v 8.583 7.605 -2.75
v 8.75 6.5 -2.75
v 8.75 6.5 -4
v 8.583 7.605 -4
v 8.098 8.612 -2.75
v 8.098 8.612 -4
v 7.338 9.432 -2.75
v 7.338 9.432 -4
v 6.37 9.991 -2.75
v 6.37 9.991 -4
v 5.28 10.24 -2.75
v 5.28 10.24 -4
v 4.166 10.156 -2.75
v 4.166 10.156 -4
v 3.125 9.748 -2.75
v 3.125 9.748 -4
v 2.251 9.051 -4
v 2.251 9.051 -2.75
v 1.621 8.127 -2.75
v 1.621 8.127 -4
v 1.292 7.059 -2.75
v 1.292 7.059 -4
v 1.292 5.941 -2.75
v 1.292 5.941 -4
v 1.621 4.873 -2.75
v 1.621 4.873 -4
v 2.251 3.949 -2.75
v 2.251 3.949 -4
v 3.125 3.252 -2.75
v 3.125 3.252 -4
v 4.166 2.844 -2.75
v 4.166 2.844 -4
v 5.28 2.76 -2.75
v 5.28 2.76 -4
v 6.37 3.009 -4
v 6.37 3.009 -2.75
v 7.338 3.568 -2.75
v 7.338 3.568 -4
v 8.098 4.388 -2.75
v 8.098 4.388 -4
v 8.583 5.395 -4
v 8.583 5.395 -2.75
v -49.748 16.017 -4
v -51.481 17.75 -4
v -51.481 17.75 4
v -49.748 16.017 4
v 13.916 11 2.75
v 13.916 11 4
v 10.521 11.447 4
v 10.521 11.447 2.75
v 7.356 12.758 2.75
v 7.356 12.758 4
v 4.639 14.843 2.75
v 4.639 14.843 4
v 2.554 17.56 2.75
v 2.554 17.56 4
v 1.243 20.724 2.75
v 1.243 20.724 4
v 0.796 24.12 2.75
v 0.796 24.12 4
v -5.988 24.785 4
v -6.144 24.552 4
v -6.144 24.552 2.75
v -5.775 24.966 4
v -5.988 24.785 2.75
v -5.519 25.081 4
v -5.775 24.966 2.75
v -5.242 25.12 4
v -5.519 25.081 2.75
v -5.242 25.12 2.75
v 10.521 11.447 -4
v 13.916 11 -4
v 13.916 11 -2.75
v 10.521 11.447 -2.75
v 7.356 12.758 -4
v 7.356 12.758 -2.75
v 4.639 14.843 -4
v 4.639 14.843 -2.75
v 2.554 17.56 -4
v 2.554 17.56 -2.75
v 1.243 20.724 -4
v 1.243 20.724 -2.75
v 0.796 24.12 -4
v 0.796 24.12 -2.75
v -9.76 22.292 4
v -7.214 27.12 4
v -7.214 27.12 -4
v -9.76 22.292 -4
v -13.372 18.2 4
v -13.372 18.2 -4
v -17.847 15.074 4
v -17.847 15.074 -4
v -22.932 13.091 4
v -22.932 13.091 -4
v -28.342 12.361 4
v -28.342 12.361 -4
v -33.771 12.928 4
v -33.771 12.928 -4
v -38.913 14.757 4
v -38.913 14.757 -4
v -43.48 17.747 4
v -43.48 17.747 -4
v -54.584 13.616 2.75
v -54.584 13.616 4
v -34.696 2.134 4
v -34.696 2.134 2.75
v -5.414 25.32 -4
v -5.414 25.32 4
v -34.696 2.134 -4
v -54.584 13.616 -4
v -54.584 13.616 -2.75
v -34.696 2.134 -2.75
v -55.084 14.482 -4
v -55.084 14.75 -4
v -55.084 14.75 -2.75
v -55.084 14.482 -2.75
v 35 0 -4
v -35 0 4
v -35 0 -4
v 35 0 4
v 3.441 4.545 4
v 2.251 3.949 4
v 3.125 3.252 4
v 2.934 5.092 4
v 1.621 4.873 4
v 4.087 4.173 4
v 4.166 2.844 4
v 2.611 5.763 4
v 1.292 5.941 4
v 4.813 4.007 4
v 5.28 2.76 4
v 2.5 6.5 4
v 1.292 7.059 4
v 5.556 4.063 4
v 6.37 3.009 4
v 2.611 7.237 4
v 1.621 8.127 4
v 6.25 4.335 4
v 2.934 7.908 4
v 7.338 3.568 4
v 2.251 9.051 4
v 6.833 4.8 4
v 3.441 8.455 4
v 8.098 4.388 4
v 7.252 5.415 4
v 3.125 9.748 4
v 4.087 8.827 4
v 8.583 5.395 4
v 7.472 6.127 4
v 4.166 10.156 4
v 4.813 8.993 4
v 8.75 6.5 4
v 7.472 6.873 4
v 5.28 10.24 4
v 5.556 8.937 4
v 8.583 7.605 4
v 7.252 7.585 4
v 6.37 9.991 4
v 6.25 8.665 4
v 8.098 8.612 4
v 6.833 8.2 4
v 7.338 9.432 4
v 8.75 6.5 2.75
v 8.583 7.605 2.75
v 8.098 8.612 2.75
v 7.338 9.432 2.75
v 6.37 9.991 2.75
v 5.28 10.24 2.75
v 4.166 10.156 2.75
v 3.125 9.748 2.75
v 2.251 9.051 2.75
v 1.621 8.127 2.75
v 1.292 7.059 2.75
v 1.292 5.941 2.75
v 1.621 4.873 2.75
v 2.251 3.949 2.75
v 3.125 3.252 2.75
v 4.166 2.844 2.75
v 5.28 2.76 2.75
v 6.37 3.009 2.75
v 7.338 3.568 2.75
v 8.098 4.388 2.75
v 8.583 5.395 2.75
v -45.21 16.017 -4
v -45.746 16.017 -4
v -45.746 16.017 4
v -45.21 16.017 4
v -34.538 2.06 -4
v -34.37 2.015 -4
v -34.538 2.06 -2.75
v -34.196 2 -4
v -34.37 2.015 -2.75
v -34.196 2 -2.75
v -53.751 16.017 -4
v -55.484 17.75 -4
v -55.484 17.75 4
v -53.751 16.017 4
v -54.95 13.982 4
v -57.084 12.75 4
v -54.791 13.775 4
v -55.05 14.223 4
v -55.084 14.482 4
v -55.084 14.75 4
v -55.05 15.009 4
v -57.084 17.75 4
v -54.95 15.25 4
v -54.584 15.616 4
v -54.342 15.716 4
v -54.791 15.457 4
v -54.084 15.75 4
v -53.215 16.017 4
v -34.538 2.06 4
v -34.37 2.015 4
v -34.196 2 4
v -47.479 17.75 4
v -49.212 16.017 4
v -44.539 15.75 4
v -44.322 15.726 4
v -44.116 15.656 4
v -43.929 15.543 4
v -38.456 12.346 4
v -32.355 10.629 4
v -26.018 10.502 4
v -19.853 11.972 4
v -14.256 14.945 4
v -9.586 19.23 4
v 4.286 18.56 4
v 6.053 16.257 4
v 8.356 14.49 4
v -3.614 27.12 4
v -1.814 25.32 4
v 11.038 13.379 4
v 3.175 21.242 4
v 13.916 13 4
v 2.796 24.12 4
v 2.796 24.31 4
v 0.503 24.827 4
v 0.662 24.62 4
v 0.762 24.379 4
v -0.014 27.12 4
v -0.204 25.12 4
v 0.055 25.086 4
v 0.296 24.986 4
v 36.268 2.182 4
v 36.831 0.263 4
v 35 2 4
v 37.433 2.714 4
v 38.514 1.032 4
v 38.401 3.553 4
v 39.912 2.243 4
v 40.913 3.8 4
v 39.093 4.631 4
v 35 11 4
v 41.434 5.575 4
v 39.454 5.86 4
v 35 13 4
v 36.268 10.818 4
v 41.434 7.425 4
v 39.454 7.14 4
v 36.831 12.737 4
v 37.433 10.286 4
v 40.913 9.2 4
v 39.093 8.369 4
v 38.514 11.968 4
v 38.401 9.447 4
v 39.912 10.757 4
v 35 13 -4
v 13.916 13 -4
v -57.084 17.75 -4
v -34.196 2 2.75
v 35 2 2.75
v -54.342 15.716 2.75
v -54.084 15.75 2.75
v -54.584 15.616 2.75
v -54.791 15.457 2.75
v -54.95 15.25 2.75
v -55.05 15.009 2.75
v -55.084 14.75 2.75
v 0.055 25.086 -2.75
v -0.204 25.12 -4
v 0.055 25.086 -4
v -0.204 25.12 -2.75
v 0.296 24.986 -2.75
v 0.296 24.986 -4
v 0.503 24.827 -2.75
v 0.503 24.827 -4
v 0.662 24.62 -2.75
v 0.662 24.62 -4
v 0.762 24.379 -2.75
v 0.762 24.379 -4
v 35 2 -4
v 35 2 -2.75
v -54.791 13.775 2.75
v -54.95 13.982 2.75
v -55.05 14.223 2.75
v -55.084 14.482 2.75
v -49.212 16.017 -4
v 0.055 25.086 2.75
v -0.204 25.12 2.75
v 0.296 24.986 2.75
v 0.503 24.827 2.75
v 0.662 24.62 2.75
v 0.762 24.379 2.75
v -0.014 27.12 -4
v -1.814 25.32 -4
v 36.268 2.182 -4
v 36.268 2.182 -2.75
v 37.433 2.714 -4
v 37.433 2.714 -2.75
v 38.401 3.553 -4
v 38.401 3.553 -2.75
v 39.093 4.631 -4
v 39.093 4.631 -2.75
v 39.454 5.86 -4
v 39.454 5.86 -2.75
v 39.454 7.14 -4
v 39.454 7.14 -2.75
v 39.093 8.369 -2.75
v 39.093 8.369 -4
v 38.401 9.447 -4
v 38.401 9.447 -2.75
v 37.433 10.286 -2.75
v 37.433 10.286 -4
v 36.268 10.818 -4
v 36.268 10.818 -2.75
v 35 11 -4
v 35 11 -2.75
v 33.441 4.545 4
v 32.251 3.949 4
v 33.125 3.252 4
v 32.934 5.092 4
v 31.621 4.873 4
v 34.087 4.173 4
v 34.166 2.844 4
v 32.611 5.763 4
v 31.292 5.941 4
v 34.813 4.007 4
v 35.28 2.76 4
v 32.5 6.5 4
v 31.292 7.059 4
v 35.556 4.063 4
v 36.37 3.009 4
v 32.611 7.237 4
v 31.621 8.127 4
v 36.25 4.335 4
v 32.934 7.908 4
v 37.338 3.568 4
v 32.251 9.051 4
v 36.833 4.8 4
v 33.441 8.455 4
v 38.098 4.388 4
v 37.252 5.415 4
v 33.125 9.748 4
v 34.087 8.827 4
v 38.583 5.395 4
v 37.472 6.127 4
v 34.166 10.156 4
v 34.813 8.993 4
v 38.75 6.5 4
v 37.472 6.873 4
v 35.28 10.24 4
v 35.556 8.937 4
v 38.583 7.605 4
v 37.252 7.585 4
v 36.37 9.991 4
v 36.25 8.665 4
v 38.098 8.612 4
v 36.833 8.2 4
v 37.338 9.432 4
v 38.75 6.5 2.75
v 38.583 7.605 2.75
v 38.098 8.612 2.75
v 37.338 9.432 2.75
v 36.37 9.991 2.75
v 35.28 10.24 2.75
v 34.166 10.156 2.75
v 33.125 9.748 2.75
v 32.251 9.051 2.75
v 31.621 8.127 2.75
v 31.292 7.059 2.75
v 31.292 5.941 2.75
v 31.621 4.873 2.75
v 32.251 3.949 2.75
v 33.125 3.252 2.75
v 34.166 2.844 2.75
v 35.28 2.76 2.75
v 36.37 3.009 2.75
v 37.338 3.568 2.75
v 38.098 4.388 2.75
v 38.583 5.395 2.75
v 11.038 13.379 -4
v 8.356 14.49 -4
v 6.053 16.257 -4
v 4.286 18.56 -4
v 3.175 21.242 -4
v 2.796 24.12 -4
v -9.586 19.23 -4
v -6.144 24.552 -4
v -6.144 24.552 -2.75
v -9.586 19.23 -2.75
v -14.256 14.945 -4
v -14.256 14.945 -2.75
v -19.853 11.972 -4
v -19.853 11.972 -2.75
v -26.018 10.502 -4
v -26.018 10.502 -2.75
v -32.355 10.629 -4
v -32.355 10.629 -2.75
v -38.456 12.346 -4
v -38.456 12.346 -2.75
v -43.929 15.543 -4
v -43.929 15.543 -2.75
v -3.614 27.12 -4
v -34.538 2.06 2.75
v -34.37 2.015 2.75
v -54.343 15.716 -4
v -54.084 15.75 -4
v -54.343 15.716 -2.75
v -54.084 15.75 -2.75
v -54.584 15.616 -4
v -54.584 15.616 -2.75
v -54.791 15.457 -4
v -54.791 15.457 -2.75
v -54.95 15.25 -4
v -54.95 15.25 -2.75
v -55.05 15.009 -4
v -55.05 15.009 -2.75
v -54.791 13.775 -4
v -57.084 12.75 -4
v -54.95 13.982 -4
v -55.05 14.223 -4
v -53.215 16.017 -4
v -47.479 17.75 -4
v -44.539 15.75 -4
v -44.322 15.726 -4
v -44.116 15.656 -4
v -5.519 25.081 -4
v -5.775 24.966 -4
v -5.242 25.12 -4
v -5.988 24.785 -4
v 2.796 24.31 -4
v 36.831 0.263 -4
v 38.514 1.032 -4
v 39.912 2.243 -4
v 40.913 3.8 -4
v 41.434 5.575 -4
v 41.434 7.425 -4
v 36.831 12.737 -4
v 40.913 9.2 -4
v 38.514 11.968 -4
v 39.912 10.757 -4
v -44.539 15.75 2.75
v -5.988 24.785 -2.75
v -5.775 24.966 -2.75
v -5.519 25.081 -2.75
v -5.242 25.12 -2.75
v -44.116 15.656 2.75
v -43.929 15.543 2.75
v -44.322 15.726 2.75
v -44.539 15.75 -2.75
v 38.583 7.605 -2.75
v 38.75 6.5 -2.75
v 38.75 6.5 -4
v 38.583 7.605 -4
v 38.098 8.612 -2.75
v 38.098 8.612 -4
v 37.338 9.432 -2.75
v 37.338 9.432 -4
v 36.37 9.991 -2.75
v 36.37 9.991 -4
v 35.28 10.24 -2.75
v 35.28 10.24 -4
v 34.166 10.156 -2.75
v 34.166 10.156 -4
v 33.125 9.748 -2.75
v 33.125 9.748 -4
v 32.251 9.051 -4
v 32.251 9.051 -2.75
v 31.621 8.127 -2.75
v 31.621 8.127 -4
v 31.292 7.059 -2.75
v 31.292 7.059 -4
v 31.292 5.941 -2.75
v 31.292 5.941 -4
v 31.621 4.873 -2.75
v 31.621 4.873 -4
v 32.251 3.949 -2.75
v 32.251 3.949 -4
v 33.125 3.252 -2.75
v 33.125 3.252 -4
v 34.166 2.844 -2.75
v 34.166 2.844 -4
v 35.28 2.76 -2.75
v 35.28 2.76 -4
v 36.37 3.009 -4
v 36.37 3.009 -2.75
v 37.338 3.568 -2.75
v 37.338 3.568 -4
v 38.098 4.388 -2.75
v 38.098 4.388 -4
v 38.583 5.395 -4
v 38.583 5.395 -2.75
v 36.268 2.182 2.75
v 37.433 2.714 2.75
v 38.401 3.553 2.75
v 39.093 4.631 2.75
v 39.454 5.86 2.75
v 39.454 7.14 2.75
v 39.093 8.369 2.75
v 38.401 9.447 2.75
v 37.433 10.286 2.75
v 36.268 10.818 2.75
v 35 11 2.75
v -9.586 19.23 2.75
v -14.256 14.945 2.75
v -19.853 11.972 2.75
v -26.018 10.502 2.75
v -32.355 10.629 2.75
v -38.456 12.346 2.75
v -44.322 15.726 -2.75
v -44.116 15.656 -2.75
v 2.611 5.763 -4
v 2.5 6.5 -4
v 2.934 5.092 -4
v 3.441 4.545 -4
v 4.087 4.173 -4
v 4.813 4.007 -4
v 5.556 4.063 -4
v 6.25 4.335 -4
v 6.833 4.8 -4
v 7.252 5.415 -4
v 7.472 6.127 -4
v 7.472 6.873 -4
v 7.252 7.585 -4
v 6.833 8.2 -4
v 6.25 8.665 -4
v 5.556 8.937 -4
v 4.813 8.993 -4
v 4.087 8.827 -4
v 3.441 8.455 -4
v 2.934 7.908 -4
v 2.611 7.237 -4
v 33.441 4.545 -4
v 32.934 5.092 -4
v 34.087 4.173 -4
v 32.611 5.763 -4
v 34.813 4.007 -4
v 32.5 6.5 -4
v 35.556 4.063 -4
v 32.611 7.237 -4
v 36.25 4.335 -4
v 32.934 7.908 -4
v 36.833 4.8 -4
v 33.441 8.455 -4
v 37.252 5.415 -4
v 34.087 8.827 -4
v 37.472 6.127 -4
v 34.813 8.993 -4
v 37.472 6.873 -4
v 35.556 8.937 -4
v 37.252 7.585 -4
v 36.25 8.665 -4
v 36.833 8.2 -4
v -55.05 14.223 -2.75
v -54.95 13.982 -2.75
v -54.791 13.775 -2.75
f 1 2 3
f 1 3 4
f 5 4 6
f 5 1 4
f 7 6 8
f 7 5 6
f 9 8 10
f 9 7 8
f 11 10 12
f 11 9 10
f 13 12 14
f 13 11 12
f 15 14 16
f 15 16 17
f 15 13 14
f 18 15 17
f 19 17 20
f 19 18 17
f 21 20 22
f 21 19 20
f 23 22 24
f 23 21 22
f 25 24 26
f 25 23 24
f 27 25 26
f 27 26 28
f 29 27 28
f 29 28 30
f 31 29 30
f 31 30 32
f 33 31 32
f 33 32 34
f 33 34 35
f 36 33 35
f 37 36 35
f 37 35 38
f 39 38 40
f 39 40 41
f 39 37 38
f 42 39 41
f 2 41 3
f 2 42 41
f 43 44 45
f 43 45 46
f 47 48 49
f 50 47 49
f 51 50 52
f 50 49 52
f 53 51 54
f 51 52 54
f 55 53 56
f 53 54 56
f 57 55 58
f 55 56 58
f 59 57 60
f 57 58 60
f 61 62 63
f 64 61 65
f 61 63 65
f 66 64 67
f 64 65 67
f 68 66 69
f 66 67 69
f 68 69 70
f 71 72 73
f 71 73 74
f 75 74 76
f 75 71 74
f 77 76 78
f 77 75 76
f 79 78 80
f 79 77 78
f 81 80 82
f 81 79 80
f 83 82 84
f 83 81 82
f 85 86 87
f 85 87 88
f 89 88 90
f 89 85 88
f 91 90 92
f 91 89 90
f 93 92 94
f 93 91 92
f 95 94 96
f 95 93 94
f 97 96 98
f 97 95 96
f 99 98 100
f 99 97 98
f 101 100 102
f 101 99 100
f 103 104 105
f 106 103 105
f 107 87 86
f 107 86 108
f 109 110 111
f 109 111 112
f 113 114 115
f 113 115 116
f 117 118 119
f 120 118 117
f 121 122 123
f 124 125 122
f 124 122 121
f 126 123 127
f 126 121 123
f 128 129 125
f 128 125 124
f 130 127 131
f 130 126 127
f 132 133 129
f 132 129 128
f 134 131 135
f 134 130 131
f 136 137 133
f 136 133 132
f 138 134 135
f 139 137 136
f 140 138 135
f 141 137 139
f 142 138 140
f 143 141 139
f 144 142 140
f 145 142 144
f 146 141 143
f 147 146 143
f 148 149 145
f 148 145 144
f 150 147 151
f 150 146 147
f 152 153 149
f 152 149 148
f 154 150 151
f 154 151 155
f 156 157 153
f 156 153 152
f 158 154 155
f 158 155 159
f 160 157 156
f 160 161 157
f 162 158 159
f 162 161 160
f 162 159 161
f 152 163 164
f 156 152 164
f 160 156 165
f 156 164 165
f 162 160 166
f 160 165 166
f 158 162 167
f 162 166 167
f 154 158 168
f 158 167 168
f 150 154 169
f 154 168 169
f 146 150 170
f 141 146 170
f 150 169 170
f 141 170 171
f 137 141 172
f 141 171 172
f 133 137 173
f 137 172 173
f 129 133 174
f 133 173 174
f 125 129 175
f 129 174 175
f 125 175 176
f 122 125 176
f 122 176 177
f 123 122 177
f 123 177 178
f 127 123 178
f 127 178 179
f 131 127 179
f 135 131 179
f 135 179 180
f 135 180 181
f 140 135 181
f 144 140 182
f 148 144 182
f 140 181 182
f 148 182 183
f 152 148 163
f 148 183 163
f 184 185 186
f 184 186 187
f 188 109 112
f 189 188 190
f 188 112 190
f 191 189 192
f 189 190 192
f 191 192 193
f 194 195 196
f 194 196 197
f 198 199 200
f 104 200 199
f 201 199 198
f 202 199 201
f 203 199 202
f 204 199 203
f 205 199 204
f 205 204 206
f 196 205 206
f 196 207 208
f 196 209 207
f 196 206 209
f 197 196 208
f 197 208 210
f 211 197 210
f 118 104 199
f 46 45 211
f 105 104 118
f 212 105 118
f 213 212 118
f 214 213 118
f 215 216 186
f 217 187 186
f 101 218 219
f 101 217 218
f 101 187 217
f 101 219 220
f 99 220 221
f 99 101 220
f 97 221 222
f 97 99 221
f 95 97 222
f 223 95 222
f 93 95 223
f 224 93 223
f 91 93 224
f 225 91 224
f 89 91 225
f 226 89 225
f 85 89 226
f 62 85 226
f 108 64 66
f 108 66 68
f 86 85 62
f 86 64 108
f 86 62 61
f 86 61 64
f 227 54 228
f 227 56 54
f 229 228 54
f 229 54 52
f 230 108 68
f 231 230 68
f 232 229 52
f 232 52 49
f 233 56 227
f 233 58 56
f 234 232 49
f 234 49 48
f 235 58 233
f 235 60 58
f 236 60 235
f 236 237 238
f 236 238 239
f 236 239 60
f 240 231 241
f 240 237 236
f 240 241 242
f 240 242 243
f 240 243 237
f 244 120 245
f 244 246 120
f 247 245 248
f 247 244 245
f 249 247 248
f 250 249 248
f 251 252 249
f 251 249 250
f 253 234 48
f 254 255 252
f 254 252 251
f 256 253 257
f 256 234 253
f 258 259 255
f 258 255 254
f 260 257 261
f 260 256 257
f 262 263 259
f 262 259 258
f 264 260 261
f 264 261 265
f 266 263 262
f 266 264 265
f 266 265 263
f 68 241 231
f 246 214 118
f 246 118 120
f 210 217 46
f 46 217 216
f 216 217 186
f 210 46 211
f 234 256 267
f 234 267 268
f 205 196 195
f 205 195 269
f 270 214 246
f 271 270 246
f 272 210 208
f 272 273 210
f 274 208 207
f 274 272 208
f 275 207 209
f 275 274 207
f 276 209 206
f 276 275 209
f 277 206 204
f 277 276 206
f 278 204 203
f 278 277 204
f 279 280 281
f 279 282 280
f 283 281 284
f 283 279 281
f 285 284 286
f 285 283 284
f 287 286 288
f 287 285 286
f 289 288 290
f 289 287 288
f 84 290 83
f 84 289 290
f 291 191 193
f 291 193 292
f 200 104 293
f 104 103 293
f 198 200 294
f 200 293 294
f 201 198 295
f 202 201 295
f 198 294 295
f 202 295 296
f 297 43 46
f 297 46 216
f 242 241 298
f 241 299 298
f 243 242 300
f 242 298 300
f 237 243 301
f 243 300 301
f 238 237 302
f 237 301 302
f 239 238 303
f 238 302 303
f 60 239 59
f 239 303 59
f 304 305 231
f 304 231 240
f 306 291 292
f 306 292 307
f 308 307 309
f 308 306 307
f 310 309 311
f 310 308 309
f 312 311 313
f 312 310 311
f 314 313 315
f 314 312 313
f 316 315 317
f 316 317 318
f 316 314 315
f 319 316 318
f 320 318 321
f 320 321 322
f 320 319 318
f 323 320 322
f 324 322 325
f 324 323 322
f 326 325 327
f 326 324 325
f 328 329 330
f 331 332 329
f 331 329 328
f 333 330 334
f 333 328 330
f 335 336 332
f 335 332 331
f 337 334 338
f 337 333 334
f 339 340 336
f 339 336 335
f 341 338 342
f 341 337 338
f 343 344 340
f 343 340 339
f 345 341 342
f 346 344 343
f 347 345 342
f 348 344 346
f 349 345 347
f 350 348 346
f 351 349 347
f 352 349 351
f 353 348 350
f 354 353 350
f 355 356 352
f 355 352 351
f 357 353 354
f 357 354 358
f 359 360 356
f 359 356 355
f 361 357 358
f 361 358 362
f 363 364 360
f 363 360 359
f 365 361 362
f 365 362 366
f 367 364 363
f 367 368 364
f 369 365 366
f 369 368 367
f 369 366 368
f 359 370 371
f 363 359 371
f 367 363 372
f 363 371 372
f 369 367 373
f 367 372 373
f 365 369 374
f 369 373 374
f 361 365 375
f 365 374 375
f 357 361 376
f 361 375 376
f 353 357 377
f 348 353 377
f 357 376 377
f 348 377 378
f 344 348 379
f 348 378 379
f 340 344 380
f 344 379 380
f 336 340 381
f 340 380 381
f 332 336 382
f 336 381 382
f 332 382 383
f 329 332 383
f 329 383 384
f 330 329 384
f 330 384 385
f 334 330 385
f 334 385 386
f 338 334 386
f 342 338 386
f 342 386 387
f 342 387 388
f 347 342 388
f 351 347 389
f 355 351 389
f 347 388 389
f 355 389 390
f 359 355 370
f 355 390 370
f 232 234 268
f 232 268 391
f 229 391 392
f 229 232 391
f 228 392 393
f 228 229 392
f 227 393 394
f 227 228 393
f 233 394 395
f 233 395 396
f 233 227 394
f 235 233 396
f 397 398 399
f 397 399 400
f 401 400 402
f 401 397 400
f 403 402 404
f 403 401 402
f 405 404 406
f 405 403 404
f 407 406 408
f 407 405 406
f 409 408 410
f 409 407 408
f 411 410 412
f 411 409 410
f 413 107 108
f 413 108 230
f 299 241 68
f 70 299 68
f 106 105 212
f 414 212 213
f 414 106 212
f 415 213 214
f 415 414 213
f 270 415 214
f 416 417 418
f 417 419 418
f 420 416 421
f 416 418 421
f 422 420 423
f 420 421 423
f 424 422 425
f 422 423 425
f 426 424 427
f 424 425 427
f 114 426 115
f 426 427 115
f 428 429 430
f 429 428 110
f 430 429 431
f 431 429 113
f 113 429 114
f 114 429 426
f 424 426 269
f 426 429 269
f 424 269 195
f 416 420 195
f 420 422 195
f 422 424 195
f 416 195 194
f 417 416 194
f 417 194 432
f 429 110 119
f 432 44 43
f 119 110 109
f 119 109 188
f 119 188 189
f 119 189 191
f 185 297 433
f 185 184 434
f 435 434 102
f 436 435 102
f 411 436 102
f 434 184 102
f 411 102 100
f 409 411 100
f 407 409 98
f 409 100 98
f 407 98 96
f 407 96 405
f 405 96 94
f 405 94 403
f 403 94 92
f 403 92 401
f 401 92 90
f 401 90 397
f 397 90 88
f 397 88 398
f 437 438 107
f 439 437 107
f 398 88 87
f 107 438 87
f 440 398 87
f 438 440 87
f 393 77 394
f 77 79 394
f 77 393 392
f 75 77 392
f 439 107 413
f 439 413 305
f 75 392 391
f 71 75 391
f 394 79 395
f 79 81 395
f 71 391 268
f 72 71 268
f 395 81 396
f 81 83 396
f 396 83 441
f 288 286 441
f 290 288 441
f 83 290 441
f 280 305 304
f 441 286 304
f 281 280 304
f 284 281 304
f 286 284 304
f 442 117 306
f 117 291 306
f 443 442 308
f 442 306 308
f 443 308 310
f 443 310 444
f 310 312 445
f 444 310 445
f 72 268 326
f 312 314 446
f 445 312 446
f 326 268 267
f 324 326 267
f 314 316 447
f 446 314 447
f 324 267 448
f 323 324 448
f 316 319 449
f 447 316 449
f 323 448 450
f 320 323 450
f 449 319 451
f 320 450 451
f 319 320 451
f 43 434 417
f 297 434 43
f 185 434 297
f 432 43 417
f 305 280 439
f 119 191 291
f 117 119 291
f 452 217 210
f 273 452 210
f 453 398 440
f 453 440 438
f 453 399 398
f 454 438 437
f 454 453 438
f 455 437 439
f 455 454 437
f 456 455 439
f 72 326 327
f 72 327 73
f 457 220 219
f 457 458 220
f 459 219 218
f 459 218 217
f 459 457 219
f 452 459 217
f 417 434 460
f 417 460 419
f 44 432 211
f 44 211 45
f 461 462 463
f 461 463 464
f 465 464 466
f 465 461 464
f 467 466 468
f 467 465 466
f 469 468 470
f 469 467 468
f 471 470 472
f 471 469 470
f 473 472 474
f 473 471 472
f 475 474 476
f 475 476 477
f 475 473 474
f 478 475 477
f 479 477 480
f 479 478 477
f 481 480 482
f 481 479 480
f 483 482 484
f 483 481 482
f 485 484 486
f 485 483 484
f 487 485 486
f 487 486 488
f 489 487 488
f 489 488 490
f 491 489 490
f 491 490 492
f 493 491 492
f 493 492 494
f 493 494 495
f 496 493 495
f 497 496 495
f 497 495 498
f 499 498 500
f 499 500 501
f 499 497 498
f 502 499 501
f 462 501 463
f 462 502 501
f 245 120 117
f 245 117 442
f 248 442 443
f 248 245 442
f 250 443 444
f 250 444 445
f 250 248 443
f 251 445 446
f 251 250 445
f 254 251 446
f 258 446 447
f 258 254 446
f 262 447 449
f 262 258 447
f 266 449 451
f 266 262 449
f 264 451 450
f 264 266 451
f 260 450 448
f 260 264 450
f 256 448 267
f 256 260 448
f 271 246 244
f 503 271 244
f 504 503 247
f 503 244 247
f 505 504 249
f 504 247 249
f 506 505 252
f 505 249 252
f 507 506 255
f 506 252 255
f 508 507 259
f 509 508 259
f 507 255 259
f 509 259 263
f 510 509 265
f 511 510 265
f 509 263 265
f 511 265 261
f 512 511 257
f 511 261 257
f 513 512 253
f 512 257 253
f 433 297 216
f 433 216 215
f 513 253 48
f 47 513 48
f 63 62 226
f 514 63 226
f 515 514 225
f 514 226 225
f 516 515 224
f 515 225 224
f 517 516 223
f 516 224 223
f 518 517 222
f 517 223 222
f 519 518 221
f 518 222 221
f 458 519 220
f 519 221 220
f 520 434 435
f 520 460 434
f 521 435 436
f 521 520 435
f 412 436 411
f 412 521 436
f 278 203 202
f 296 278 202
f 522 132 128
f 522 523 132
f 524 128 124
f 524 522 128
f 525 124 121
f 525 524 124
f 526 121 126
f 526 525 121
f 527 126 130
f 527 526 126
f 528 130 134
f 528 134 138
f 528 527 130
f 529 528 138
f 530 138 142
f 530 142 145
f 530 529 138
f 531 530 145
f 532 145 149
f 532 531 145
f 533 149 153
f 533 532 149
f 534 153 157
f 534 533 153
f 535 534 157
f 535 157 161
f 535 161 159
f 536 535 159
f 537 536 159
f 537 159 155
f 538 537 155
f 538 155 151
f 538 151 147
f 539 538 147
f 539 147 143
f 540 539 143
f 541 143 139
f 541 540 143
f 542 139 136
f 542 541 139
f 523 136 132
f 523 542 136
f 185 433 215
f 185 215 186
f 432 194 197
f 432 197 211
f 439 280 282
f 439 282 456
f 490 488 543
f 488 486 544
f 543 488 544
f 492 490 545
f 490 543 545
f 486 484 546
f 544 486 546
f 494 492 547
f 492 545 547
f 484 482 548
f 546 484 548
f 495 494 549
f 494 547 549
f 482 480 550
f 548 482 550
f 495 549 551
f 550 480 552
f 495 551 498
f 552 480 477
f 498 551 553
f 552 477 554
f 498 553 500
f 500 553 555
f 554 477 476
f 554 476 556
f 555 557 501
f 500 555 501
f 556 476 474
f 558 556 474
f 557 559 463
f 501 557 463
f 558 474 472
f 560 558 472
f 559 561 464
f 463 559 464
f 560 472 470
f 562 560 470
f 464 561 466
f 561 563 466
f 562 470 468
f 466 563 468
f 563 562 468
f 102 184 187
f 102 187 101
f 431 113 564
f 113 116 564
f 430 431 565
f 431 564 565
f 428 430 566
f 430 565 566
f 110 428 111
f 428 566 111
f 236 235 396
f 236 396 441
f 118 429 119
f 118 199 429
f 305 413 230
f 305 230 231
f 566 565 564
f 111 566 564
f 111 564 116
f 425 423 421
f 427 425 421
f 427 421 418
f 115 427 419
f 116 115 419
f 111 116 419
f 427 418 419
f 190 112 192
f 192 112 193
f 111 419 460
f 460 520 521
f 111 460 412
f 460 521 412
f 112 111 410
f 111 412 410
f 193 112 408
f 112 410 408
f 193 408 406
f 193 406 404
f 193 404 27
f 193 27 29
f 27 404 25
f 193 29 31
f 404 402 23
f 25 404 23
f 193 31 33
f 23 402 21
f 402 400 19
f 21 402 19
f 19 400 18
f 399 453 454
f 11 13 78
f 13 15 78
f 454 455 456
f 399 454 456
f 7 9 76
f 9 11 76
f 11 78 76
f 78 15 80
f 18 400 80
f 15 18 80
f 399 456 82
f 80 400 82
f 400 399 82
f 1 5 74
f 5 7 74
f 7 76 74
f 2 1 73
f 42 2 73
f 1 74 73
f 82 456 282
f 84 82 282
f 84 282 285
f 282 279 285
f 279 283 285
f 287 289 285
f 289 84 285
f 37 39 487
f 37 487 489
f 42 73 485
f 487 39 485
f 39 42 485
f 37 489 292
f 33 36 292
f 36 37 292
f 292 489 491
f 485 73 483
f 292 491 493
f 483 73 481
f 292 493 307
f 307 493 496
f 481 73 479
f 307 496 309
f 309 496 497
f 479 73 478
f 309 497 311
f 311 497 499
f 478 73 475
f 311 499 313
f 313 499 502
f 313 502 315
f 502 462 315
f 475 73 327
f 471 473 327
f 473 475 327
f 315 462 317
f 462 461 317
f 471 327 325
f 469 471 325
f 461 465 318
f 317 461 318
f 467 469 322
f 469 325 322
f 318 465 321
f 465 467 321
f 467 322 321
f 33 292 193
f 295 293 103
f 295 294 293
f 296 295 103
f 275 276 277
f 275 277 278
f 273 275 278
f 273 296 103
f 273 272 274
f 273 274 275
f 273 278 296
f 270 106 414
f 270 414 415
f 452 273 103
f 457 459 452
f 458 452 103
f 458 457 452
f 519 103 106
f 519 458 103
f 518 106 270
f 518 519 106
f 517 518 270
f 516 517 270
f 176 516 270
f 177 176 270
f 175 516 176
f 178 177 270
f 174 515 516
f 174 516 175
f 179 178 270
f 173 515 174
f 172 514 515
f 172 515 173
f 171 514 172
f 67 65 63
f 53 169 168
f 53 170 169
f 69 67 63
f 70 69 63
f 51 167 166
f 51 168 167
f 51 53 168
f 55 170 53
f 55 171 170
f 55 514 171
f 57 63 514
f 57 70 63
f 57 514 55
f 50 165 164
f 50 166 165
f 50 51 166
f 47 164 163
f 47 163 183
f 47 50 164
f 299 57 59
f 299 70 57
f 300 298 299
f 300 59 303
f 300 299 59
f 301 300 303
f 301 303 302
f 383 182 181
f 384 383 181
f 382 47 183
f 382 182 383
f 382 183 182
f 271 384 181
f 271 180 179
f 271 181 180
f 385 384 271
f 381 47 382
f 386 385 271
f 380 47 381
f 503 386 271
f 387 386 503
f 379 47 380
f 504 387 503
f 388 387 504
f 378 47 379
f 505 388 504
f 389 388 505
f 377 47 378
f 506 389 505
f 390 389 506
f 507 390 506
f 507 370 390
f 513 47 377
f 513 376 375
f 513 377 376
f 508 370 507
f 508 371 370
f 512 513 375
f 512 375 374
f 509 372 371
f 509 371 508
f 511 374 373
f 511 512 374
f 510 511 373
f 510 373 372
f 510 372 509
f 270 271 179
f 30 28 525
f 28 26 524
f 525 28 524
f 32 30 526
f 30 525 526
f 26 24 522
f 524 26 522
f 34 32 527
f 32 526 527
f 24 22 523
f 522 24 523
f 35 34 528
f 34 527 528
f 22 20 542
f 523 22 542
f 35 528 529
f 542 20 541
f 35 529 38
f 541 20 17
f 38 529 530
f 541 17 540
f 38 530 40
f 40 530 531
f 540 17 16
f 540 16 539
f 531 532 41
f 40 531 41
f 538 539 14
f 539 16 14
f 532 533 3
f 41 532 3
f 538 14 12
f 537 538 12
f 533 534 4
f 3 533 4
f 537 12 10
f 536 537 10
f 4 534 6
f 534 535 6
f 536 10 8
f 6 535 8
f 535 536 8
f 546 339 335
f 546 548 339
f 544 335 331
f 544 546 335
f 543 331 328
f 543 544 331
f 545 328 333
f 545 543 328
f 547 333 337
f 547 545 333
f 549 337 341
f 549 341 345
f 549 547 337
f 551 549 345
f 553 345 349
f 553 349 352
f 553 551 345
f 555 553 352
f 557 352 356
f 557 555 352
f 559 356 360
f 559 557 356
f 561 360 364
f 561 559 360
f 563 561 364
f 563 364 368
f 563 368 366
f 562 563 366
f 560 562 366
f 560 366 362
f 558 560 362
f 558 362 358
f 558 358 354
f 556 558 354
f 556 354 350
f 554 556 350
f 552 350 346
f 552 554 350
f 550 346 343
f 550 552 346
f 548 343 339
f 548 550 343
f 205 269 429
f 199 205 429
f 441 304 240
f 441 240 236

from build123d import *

# Parameters (mm, degrees)
BOSS_EXTRUDE1_DEPTH     = 4
SKETCH2_R               = 2.5
CUT_EXTRUDE1_DEPTH      = 64.702725576
CUT_EXTRUDE2_DEPTH      = 1.25
SKETCH4_R               = 3.75
SKETCH4_R_2             = 2.5
BOSS_EXTRUDE2_DEPTH     = 1.25
CUT_EXTRUDE8_DEPTH      = 64.702725576
CUT_EXTRUDE8_DEPTH_BACK = 64.702725576
CUT_EXTRUDE9_DEPTH      = 64.702725576
CUT_EXTRUDE9_DEPTH_BACK = 64.702725576
FILLET5_R               = 1
FILLET6_R               = 1
FILLET7_R               = 1
FILLET8_R               = 1


with BuildPart() as part:
    # Sketch1 → Boss-Extrude1 (new, symmetric)
    with BuildSketch(Plane.XY):
        with BuildLine():
            Line((-35, 0), (35, 0))
            ThreePointArc((35, 0), (41.5, 6.5), (35, 13))
            Line((35, 13), (13.916352203, 13))
            ThreePointArc((13.916352203, 13), (6.053324797, 16.256972593), (2.796352203, 24.12))
            Line((2.796352203, 24.12), (2.796352203, 27.12))
            Line((2.796352203, 27.12), (-7.213647797, 27.12))
            ThreePointArc((-7.213647797, 27.12), (-22.934441841, 13.089935965), (-43.483647797, 17.75))
            Line((-43.483647797, 17.75), (-57.083647797, 17.75))
            Line((-57.083647797, 17.75), (-57.083647797, 12.75))
            Line((-57.083647797, 12.75), (-35, 0))
        make_face()
    extrude(amount=BOSS_EXTRUDE1_DEPTH, both=True)

    # Sketch2 → Cut-Extrude1 (cut, through all)
    with BuildSketch(Plane(origin=(0, 0, -4), x_dir=(-1, 0, 0), z_dir=(0, 0, -1))):
        with Locations((-35, 6.5)):
            Circle(SKETCH2_R)
        with Locations((-5, 6.5)):
            Circle(SKETCH2_R)
    extrude(amount=-CUT_EXTRUDE1_DEPTH, mode=Mode.SUBTRACT)

    # Sketch3 → Cut-Extrude2 (cut)
    with BuildSketch(Plane.XY.offset(4)):
        with BuildLine():
            Line((-44.195256898, 15.75), (-55.083647797, 15.75))
            Line((-55.083647797, 15.75), (-55.083647797, 13.904700538))
            Line((-55.083647797, 13.904700538), (-34.464101615, 2))
            Line((-34.464101615, 2), (35, 2))
            ThreePointArc((35, 2), (39.5, 6.5), (35, 11))
            Line((35, 11), (13.916352203, 11))
            ThreePointArc((13.916352203, 11), (4.639111234, 14.842759031), (0.796352203, 24.12))
            Line((0.796352203, 24.12), (0.796352203, 25.12))
            Line((0.796352203, 25.12), (-5.880235749, 25.12))
            ThreePointArc((-5.880235749, 25.12), (-22.748609603, 11.074453376), (-44.195256898, 15.75))
        make_face()
    cut_extrude2 = extrude(amount=-CUT_EXTRUDE2_DEPTH, mode=Mode.SUBTRACT)

    # Sketch4 → Boss-Extrude2 (add)
    # profile 1 of 2: a face of its own
    with BuildSketch(Plane.XY.offset(2.75)):
        with Locations((5, 6.5)):
            Circle(SKETCH4_R)
        with Locations(Location((5, 6.5, 0), (0, 0, 180))):
            Circle(SKETCH4_R_2, mode=Mode.SUBTRACT)
    # profile 2 of 2: a face of its own
    with BuildSketch(Plane.XY.offset(2.75)):
        with Locations((35, 6.5)):
            Circle(SKETCH4_R)
        with Locations(Location((35, 6.5, 0), (0, 0, 180))):
            Circle(SKETCH4_R_2, mode=Mode.SUBTRACT)
    boss_extrude2 = extrude(amount=BOSS_EXTRUDE2_DEPTH)

    # Mirror1: Cut-Extrude2, Boss-Extrude2 across plane
    add(cut_extrude2.mirror(Plane.XY), mode=Mode.SUBTRACT)
    add(boss_extrude2.mirror(Plane.XY))

    # Sketch6 → Cut-Extrude8 (cut, two sides: drawn at the far end of the back side and taken through both)
    with BuildSketch(Plane.XY.offset(4).offset(-CUT_EXTRUDE8_DEPTH_BACK)):
        Polygon((-201.988502331, 164.254854535), (-55.483647797, 17.75), (-53.750566679, 16.016918882), (-53.214504533, 16.016918882), (-51.481423415, 17.75), (-49.748342297, 16.016918882), (-49.212280151, 16.016918882), (-47.479199033, 17.75), (-45.746117916, 16.016918882), (-45.21005577, 16.016918882), (-43.476974652, 17.75), (103.027879883, 164.254854535), (103.027879883, 578.633159007), (-201.988502331, 578.633159007), align=None)
    extrude(amount=CUT_EXTRUDE8_DEPTH + CUT_EXTRUDE8_DEPTH_BACK, mode=Mode.SUBTRACT)

    # Sketch9 → Cut-Extrude9 (cut, two sides: drawn at the far end of the back side and taken through both)
    with BuildSketch(Plane.XY.offset(4).offset(-CUT_EXTRUDE9_DEPTH_BACK)):
        Polygon((-3.613647797, 27.12), (-7.213647797, 27.12), (-5.413647797, 25.32), align=None)
        Polygon((-0.013647797, 27.12), (-3.613647797, 27.12), (-1.813647797, 25.32), align=None)
        Polygon((2.796352203, 27.12), (-0.013647797, 27.12), (2.796352203, 24.31), align=None)
    extrude(amount=CUT_EXTRUDE9_DEPTH + CUT_EXTRUDE9_DEPTH_BACK, mode=Mode.SUBTRACT)

    # Fillet5
    fillet5_edges = [part.edges().sort_by_distance(p)[0] for p in [
        (-55.083647797, 15.75, 3.375),
    ]]
    fillet(fillet5_edges, radius=FILLET5_R)

    # Fillet6
    fillet6_edges = [part.edges().sort_by_distance(p)[0] for p in [
        (-44.195256898, 15.75, 3.375),
        (-55.083647797, 13.904700538, 3.375),
    ]]
    fillet(fillet6_edges, radius=FILLET6_R)

    # Fillet7
    fillet7_edges = [part.edges().sort_by_distance(p)[0] for p in [
        (0.796352203, 25.12, 3.375),
        (-34.464101615, 2, 3.375),
        (-5.880235749, 25.12, 3.375),
    ]]
    fillet(fillet7_edges, radius=FILLET7_R - 0.0001)  # a hair under: the kernel refuses the full size

    # Fillet8
    fillet8_edges = [part.edges().sort_by_distance(p)[0] for p in [
        (-55.083647797, 13.904700538, -3.375),
        (-34.464101615, 2, -3.375),
        (-44.195256898, 15.75, -3.375),
        (-55.083647797, 15.75, -3.375),
        (-5.880235749, 25.12, -3.375),
        (0.796352203, 25.12, -3.375),
    ]]
    fillet(fillet8_edges, radius=FILLET8_R - 0.0001)  # a hair under: the kernel refuses the full size


solid = part.part
